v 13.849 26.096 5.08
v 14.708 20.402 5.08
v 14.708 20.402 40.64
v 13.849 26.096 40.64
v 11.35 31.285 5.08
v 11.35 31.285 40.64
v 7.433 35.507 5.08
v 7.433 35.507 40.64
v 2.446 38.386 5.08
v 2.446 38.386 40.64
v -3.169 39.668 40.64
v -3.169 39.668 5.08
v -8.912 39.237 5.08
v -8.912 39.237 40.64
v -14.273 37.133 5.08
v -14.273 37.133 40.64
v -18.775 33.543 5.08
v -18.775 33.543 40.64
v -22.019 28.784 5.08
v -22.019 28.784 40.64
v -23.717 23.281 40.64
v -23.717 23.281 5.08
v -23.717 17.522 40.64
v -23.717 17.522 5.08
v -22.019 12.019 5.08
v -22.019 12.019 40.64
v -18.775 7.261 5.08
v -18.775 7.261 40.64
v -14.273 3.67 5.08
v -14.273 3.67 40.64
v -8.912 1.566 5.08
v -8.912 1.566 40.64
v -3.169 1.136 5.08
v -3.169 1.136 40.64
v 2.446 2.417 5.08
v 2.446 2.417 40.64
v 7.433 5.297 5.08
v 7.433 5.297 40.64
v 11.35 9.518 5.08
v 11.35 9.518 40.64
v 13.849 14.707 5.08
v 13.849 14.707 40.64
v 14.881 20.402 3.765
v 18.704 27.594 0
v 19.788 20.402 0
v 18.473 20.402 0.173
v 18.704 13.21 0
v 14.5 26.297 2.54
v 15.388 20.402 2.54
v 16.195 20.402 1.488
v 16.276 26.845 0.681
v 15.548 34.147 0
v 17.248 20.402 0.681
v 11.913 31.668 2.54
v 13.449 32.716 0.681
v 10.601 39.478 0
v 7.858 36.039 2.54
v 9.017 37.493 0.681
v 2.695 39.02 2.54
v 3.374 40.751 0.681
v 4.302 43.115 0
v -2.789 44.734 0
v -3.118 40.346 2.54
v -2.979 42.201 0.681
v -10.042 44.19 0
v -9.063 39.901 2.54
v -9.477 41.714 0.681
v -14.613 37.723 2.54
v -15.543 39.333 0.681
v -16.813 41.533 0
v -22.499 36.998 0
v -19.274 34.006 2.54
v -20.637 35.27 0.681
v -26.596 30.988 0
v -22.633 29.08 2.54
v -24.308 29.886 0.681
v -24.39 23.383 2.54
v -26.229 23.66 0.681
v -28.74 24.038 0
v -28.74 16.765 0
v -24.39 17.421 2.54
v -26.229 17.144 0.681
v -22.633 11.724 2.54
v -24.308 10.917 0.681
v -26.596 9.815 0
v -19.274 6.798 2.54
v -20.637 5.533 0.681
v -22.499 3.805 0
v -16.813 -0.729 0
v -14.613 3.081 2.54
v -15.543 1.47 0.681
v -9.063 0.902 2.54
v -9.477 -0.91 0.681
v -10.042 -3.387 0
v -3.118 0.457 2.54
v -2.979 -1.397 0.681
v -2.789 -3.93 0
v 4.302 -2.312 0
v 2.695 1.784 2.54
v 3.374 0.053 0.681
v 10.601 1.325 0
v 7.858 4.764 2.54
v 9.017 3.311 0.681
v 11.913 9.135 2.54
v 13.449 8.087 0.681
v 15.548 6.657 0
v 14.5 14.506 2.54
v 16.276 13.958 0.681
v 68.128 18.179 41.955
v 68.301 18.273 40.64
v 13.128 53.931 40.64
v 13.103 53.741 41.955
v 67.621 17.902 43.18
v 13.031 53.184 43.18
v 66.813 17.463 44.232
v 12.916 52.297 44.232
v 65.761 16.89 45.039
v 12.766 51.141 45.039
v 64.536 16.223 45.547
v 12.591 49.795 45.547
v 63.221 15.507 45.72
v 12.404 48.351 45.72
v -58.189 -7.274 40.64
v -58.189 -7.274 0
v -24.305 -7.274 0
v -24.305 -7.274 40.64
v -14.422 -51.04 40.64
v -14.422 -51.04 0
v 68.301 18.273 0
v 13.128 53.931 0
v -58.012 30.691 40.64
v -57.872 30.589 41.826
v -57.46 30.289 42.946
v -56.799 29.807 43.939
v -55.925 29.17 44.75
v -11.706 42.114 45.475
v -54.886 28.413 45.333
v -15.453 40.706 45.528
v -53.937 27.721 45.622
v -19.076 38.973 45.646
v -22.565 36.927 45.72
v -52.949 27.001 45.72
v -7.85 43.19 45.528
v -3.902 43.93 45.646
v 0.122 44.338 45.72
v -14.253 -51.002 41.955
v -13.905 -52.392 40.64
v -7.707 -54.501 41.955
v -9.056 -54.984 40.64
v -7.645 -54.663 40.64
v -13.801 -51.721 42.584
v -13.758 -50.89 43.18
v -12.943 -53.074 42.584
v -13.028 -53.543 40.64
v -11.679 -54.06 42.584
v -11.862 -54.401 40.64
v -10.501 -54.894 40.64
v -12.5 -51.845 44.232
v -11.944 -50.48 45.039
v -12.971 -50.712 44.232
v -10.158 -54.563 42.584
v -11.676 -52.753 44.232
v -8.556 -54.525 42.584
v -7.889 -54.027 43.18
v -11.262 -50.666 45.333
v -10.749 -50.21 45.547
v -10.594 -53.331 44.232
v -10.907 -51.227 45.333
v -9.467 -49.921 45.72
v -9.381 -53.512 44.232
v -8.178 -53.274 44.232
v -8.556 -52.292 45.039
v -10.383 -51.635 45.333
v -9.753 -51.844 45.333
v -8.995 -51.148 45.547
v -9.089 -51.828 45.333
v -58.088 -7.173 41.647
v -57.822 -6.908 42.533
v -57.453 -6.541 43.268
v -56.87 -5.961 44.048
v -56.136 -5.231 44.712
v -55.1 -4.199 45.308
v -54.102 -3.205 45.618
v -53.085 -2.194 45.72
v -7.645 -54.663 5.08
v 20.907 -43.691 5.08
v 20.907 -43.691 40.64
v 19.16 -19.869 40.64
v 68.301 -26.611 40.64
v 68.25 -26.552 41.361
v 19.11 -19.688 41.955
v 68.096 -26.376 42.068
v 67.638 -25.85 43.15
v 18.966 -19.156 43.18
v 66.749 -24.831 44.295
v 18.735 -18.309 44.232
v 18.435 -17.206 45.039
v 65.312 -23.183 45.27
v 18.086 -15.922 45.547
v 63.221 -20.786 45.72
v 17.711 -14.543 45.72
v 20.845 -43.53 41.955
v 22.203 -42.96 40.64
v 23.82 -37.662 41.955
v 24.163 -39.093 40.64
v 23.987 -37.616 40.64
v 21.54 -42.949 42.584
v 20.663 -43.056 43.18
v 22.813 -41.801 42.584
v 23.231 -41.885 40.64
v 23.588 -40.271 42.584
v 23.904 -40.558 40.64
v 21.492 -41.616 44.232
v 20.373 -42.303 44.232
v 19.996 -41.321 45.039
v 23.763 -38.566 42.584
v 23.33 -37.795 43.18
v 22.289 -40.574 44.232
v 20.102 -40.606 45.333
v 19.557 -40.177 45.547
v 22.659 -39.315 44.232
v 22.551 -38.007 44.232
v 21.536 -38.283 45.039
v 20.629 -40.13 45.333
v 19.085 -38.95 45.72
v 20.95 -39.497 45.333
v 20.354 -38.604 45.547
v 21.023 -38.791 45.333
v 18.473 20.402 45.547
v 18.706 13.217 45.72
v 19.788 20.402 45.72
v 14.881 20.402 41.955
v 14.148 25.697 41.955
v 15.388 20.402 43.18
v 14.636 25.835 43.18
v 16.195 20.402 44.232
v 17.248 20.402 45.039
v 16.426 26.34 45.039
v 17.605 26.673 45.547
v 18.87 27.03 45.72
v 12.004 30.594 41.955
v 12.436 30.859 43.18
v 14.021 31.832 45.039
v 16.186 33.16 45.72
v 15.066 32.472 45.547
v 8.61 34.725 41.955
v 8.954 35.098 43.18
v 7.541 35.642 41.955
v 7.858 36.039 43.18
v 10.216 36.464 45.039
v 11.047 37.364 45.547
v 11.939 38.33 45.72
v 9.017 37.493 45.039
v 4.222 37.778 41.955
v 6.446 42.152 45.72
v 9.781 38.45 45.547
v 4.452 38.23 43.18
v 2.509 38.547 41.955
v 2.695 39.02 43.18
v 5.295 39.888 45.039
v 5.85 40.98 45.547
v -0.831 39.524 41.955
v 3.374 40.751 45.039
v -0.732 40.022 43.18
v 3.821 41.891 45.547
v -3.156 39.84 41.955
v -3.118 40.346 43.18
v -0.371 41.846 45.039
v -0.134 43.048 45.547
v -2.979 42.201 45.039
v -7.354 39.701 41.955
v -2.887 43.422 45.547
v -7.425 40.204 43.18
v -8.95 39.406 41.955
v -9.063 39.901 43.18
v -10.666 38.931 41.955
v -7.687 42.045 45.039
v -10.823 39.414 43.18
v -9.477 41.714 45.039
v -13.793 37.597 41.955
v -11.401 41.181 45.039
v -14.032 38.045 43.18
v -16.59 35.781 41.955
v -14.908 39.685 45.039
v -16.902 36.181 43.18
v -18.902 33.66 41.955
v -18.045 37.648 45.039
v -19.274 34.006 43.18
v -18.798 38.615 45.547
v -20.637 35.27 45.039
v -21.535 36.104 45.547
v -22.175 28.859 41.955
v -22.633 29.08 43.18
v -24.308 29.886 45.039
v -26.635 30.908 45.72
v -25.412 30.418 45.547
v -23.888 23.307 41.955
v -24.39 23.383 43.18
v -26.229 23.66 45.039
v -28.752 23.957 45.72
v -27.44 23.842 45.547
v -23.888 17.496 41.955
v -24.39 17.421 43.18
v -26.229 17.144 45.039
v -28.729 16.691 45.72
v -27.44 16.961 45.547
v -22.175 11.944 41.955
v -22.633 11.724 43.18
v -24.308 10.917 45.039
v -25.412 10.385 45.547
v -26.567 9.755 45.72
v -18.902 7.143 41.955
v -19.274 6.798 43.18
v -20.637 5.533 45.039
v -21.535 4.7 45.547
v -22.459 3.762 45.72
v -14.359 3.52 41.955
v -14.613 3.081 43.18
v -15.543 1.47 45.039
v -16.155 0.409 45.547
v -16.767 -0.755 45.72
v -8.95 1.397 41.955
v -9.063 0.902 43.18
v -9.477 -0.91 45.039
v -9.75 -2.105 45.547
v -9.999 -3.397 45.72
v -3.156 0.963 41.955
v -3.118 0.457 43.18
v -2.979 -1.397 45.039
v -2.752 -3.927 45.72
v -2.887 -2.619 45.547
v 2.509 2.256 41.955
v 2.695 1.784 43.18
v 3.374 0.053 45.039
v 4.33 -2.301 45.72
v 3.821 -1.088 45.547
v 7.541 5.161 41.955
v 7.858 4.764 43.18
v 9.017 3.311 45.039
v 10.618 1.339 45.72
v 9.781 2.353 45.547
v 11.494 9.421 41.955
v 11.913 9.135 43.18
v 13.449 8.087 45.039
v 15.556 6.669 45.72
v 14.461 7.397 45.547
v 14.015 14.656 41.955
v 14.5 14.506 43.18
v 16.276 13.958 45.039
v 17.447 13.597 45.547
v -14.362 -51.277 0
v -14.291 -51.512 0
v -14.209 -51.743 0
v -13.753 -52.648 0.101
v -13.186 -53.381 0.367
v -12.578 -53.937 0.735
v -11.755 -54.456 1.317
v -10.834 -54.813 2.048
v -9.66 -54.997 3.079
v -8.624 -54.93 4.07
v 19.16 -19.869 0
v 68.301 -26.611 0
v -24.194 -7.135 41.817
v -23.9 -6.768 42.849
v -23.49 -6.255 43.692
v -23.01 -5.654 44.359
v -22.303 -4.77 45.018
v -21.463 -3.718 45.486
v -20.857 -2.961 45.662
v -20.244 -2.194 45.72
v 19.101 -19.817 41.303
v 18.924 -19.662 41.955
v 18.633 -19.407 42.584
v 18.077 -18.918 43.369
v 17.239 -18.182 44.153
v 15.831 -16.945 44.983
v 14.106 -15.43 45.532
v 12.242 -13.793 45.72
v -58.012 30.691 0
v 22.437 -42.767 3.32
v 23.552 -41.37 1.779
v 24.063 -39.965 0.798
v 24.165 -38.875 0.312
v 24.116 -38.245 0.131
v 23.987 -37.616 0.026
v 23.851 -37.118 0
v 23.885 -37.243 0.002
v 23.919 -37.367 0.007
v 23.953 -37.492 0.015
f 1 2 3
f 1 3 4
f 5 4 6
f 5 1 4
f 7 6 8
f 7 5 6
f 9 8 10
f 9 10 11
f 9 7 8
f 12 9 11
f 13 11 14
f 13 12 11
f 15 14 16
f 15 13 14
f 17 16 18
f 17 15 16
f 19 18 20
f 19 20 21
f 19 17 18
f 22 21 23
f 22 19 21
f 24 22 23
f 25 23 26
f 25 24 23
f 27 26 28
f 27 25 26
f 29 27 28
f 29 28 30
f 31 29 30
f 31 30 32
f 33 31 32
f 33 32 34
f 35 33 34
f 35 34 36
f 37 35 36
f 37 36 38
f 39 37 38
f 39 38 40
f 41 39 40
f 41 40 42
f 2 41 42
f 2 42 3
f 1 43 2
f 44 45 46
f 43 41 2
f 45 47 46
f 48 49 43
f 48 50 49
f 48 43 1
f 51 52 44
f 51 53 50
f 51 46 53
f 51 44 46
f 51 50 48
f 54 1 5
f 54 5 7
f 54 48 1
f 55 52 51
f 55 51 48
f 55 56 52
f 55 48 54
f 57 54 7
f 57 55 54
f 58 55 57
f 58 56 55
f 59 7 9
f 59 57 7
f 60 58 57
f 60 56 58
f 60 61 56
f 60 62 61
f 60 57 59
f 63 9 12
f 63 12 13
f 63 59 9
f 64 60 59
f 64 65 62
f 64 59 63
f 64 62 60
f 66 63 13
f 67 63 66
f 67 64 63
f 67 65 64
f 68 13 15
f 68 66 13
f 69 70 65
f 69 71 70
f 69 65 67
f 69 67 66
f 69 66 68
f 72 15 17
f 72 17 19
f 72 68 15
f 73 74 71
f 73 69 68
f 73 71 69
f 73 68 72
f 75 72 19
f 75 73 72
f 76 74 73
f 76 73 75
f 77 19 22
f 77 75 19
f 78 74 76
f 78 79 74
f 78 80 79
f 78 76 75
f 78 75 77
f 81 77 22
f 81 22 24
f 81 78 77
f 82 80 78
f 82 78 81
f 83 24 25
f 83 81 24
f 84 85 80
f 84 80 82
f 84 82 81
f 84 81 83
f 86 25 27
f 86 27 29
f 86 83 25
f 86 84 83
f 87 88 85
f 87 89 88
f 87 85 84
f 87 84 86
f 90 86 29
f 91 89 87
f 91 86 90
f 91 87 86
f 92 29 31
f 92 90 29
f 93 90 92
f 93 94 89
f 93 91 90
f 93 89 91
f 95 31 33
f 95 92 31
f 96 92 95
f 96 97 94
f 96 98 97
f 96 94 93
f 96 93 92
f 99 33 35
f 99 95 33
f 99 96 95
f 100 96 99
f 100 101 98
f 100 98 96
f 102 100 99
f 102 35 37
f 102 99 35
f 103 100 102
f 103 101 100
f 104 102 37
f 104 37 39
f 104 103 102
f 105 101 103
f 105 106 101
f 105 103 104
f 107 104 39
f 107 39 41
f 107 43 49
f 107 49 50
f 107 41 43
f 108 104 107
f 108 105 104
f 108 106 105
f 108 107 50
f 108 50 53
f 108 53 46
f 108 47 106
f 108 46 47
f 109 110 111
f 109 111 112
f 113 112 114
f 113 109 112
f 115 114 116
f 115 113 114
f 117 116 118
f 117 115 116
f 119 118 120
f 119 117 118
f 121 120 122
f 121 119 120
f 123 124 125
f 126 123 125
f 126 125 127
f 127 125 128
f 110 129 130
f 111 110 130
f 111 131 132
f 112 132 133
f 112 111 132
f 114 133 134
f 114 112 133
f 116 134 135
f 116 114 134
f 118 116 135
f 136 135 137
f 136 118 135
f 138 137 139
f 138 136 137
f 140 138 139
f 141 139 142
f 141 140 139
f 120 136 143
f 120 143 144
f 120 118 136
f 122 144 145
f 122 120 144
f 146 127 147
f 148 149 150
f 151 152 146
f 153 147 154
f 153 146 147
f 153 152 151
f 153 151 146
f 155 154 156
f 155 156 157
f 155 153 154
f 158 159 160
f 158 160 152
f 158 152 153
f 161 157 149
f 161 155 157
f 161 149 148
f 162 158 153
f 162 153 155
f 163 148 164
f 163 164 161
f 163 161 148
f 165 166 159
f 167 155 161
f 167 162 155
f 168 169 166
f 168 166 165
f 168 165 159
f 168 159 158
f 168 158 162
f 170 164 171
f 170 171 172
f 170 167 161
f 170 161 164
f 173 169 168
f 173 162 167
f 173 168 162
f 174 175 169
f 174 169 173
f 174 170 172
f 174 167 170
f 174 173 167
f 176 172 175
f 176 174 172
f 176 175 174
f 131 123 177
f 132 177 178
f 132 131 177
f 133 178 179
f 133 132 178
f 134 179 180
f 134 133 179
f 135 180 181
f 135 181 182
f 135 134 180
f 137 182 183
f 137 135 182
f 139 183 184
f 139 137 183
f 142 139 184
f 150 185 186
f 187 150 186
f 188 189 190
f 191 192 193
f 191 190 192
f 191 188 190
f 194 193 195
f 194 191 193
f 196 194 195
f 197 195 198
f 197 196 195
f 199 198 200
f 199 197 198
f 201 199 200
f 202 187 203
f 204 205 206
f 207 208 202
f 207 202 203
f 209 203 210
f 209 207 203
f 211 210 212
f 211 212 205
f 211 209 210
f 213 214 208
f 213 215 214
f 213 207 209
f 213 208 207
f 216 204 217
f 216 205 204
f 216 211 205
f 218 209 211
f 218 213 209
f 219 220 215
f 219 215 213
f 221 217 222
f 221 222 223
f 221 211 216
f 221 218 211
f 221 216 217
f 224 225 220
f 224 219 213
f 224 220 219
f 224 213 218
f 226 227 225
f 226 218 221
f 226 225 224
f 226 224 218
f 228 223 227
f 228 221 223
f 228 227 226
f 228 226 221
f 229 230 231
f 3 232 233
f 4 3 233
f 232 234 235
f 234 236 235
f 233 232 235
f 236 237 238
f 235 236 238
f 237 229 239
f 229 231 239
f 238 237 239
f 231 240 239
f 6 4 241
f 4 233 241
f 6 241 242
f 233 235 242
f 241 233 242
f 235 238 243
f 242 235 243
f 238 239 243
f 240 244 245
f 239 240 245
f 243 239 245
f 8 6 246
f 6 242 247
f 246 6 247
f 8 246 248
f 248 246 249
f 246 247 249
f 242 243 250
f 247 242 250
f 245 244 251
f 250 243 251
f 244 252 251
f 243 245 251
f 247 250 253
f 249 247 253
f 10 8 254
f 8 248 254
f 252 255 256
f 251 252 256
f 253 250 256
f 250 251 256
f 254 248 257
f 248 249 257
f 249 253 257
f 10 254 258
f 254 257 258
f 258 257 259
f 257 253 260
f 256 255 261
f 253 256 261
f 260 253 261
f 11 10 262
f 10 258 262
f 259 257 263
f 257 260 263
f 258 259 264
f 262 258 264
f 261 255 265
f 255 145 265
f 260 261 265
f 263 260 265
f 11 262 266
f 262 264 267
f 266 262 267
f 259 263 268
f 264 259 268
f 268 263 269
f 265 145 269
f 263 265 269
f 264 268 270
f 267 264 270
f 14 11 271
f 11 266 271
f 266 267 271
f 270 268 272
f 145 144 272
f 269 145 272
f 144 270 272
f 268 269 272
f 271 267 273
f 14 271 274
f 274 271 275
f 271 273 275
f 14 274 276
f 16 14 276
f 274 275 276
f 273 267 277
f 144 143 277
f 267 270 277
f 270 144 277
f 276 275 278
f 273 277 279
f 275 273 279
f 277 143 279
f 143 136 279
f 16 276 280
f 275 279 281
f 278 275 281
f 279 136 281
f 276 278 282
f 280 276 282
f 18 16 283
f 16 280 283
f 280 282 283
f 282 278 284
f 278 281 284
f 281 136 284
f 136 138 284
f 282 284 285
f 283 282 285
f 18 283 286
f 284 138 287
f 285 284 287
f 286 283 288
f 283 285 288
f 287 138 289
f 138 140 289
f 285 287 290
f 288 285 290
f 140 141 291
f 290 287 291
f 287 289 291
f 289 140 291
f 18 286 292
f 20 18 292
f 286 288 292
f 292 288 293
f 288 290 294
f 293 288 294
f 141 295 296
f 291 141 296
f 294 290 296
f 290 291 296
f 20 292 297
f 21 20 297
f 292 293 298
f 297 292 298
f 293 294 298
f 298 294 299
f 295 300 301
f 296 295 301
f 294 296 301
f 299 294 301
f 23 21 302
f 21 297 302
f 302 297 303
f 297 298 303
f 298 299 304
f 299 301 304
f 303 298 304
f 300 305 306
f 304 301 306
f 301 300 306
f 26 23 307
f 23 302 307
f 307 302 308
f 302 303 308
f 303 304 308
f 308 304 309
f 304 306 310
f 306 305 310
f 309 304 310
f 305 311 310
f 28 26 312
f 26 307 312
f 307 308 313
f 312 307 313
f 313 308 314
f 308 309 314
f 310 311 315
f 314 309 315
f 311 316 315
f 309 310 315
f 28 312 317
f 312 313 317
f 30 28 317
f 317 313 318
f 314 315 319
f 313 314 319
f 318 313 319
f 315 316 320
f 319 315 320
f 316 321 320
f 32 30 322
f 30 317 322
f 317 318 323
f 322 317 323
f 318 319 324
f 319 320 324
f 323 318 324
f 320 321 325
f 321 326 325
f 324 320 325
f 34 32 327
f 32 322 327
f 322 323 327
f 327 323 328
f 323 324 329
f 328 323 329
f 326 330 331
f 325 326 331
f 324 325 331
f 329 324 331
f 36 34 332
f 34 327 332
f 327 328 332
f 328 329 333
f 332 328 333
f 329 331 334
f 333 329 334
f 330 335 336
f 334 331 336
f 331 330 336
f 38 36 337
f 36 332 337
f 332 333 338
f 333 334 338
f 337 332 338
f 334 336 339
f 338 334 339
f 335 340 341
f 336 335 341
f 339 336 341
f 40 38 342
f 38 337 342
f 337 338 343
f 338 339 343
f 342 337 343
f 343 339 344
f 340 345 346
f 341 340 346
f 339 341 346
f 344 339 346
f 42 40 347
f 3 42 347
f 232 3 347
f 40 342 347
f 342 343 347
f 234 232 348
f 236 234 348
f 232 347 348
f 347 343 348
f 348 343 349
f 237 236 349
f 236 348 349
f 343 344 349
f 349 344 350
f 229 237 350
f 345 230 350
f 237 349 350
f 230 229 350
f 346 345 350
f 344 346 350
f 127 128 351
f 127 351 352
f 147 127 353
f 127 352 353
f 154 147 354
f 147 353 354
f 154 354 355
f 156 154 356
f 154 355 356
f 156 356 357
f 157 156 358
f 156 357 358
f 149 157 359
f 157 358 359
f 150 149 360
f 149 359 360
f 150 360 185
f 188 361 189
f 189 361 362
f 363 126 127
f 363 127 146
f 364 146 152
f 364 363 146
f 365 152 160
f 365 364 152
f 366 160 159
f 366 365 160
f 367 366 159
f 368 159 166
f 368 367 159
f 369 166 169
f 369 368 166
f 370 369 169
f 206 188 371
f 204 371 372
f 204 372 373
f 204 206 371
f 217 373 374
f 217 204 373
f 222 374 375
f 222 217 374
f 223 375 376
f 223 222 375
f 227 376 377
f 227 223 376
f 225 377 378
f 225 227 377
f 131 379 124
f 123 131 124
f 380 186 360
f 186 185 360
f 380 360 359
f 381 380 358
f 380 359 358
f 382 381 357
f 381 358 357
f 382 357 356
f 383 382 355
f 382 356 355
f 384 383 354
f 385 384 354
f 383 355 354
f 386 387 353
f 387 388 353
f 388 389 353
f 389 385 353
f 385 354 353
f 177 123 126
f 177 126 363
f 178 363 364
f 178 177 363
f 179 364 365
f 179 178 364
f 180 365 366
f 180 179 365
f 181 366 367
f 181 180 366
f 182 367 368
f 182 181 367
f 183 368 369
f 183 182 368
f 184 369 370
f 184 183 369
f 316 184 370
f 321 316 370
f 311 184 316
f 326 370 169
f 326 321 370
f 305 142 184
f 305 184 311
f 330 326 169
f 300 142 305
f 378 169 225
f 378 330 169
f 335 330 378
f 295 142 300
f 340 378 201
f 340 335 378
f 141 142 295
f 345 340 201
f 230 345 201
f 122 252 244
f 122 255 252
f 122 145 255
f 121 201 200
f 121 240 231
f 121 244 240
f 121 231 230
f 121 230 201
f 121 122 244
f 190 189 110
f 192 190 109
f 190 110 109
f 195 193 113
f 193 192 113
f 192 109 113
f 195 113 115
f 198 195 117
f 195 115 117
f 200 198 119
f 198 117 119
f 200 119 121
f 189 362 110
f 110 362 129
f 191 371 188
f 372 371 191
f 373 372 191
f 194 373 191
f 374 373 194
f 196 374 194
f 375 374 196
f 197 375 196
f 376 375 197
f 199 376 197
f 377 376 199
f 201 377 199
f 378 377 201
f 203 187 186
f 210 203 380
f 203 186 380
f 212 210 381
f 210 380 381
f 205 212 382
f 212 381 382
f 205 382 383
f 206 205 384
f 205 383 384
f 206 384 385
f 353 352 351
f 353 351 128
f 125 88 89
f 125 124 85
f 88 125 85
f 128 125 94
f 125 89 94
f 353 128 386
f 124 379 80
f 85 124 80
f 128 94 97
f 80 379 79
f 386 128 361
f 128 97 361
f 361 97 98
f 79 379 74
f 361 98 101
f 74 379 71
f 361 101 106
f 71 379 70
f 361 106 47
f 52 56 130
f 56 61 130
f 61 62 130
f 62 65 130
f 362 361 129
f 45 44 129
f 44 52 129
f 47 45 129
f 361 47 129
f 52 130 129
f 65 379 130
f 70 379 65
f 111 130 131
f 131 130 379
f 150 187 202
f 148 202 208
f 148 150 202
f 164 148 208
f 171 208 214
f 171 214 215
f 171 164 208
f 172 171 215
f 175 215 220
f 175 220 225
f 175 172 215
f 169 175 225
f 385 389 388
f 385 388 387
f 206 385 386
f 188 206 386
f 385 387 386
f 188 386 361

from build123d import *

# Parameters (mm, degrees)
F0_R         = 19.3201303499
F1_DEPTH     = 45.72
F2_T1_DEPTH  = 55.325963316
F2_T3_DEPTH  = 52.1146440054
F2_T5_DEPTH  = 66.4513256331
F2_T7_DEPTH  = 30.5870827045
F2_T9_DEPTH  = 100.2395855595
F2_T11_DEPTH = 63.3652483976
F2_T13_DEPTH = 70.2836609721
F2_T15_DEPTH = 91.0933305156
F2_T20_DEPTH = 5.08
F2_T26_DEPTH = 5.08
F2_T36_DEPTH = 59.2845010847
F2_T41_DEPTH = 57.568004282
F2_T46_DEPTH = 31.0915483116
F2_T51_DEPTH = 75.0016446771
F2_T57_DEPTH = 59.2845010847
F2_T61_DEPTH = 57.568004282
F2_T68_DEPTH = 31.0915483116
F2_T72_DEPTH = 75.0016446771


# Not quite as in the source:
# - a fillet or chamfer that OpenCascade refuses, or shapes differently, is made with other operations: its cross-section is extruded or revolved along the edge and cut away or added


with BuildPart() as f1:
    # F0 (on Top) → F1 (new body)
    with BuildSketch(Plane.XY):
        Polygon((13.1280273199, 53.9313554764), (-58.0116845667, 30.691197142), (-58.1890903413, -7.2736367583), (-24.3045892566, -7.2736367583), (-13.1280263886, -56.7698441446), (25.1916181296, -42.0451648533), (19.1598236561, -19.8694467545), (68.3012157679, -26.610866189), (68.3012157679, 18.2727947831), align=None)
        with Locations((-4.6125496738, 20.4016622156)):
            Circle(F0_R, mode=Mode.SUBTRACT)
    extrude(amount=F1_DEPTH)

    # F2: fillet of radius 5.08 on 15 edges, made by hand

    # F2_s2 → F2_t1 (cut)
    with BuildSketch(Plane.XY.offset(-14.685963316)):
        with BuildLine():
            ThreePointArc((-14.4219236098, -51.039727833), (-11.8616097658, -54.4008391443), (-7.6445406789, -54.662763834))
            Line((-7.6445406789, -54.662763834), (-13.1280263886, -56.7698441446))
            Line((-13.1280263886, -56.7698441446), (-14.4219236098, -51.039727833))
        make_face()
    extrude(amount=F2_T1_DEPTH, mode=Mode.SUBTRACT)

    # F2_s4 → F2_t3 (cut)
    with BuildSketch(Plane.XY.offset(-11.4746440054)):
        with BuildLine():
            ThreePointArc((20.9071837297, -43.6914985622), (23.6160955732, -41.2464799373), (23.9869451943, -37.6162196147))
            Line((23.9869451943, -37.6162196147), (25.1916181296, -42.0451648533))
            Line((25.1916181296, -42.0451648533), (20.9071837297, -43.6914985622))
        make_face()
    extrude(amount=F2_T3_DEPTH, mode=Mode.SUBTRACT)

    # F2_s6 → F2_t5 (cut)
    with BuildSketch(Plane(origin=(-42.3016489373, -16.2548014713, 0), x_dir=(0, 0, 1), z_dir=(0.9334569329, 0.3586894958, 0))):
        with BuildLine():
            ThreePointArc((5.08, 48.2833194327), (1.4878975516, 46.7954218811), (0, 43.2033194327))
            Line((0, 43.2033194327), (0, 48.2833194327))
            Line((0, 48.2833194327), (5.08, 48.2833194327))
        make_face()
    extrude(amount=F2_T5_DEPTH, mode=Mode.SUBTRACT)

    # F2_s8 → F2_t7 (cut)
    with BuildSketch(Plane(origin=(-24.9632601794, -9.5923645646, 0), x_dir=(0, 0, 1), z_dir=(0.9334569329, 0.3586894958, 0))):
        with BuildLine():
            ThreePointArc((40.64, 48.2833194327), (44.2321024484, 46.7954218811), (45.72, 43.2033194327))
            Line((45.72, 43.2033194327), (45.72, 48.2833194327))
            Line((45.72, 48.2833194327), (40.64, 48.2833194327))
        make_face()
    extrude(amount=F2_T7_DEPTH, mode=Mode.SUBTRACT)

    # F2_s10 → F2_t9 (cut)
    with BuildSketch(Plane(origin=(39.8537401384, 13.0195527431, 0), x_dir=(0, 0, 1), z_dir=(-0.9505626114, -0.3105329641, 0))):
        with BuildLine():
            ThreePointArc((40.64, 47.1884448626), (44.2321024484, 45.700547311), (45.72, 42.1084448626))
            Line((45.72, 42.1084448626), (45.72, 47.1884448626))
            Line((45.72, 47.1884448626), (40.64, 47.1884448626))
        make_face()
    extrude(amount=F2_T9_DEPTH, mode=Mode.SUBTRACT)

    # F2_s12 → F2_t11 (cut)
    with BuildSketch(Plane(origin=(0.2014921201, 43.1193115962, 0), x_dir=(0, 0, 1), z_dir=(-0.0046728464, -0.9999890822, 0))):
        with BuildLine():
            ThreePointArc((40.64, 58.1544664567), (44.2321024484, 56.6665689051), (45.72, 53.0744664567))
            Line((45.72, 53.0744664567), (45.72, 58.1544664567))
            Line((45.72, 58.1544664567), (40.64, 58.1544664567))
        make_face()
    extrude(amount=F2_T11_DEPTH, mode=Mode.SUBTRACT)

    # F2_s14 → F2_t13 (cut)
    with BuildSketch(Plane.XZ.offset(-30.9727947831)):
        with BuildLine():
            ThreePointArc((68.3012157679, 40.64), (66.8133182163, 44.2321024484), (63.2212157679, 45.72))
            Line((63.2212157679, 45.72), (68.3012157679, 45.72))
            Line((68.3012157679, 45.72), (68.3012157679, 40.64))
        make_face()
    extrude(amount=F2_T13_DEPTH, mode=Mode.SUBTRACT)

    # F2_s16 → F2_t15 (cut)
    with BuildSketch(Plane(origin=(50.5132947185, -32.6468604807, 0), x_dir=(0, 0, 1), z_dir=(-0.8398598155, 0.5428033624, 0))):
        with BuildLine():
            ThreePointArc((40.64, 52.4207156327), (44.2321024484, 50.9328180811), (45.72, 47.3407156327))
            Line((45.72, 47.3407156327), (45.72, 52.4207156327))
            Line((45.72, 52.4207156327), (40.64, 52.4207156327))
        make_face()
    extrude(amount=F2_T15_DEPTH, mode=Mode.SUBTRACT)


with BuildPart() as f2_tool18:
    # F2_s19 → F2_t20 (new body)
    with BuildSketch(Plane.XY.offset(40.64)):
        Polygon((-9.4666833174, -49.9208026147), (-14.4219236098, -51.039727833), (-13.1280263886, -56.7698441446), (-7.6445406789, -54.662763834), align=None)
    extrude(amount=F2_T20_DEPTH)

    # F2_s21 → F2_t22 (revolve, cut)
    with BuildSketch(Plane(origin=(-9.4666833174, -49.9208026147, 40.64), x_dir=(0.4714422143, 0.8818969546, 0), z_dir=(0.8818969546, -0.4714422143, 0))):
        with BuildLine():
            ThreePointArc((0, -5.08), (5.08, 0), (0, 5.08))
            Line((0, 5.08), (0, -5.08))
        make_face()
    revolve(axis=Axis((-9.4666833174, -49.9208026147, 40.64), (0, 0, 1)), mode=Mode.SUBTRACT)


with BuildPart() as f1_1:
    add(f1.part)

    # F2_t17: cut F2_tool18
    add(f2_tool18.part, mode=Mode.SUBTRACT)


with BuildPart() as f2_tool24:
    # F2_s25 → F2_t26 (new body)
    with BuildSketch(Plane.XY.offset(40.64)):
        Polygon((19.0850410913, -38.9495373429), (20.9071837297, -43.6914985622), (25.1916181296, -42.0451648533), (23.9869451943, -37.6162196147), align=None)
    extrude(amount=F2_T26_DEPTH)

    # F2_s27 → F2_t28 (revolve, cut)
    with BuildSketch(Plane(origin=(19.0850410913, -38.9495373429, 40.64), x_dir=(-0.8919398586, 0.452154054, 0), z_dir=(0.452154054, 0.8919398586, 0))):
        with BuildLine():
            ThreePointArc((0, -5.08), (5.08, 0), (0, 5.08))
            Line((0, 5.08), (0, -5.08))
        make_face()
    revolve(axis=Axis((19.0850410913, -38.9495373429, 40.64), (0, 0, 1)), mode=Mode.SUBTRACT)


with BuildPart() as f1_2:
    add(f1_1.part)

    # F2_t23: cut F2_tool24
    add(f2_tool24.part, mode=Mode.SUBTRACT)

    # F2_s29 → F2_t30 (revolve, cut)
    with BuildSketch(Plane.XZ.offset(-20.4016622156)):
        with BuildLine():
            ThreePointArc((14.7075806761, 5.08), (16.1954782277, 1.4878975516), (19.7875806761, 0))
            Line((19.7875806761, 0), (14.7075806761, 0))
            Line((14.7075806761, 0), (14.7075806761, 5.08))
        make_face()
    revolve(axis=Axis((-4.6125496738, 20.4016622156, 0), (0, 0, 1)), mode=Mode.SUBTRACT)

    # F2_s31 → F2_t32 (revolve, cut)
    with BuildSketch(Plane.XZ.offset(-20.4016622156)):
        with BuildLine():
            ThreePointArc((14.7075806761, 40.64), (16.1954782277, 44.2321024484), (19.7875806761, 45.72))
            Line((19.7875806761, 45.72), (14.7075806761, 45.72))
            Line((14.7075806761, 45.72), (14.7075806761, 40.64))
        make_face()
    revolve(axis=Axis((-4.6125496738, 20.4016622156, 45.72), (0, 0, 1)), mode=Mode.SUBTRACT)


with BuildPart() as f2_tool34:
    # F2_s35 → F2_t36 (new body)
    with BuildSketch(Plane.YZ.offset(-70.8890903413)):
        with BuildLine():
            ThreePointArc((-7.2736367583, 40.64), (-5.7857392068, 44.2321024484), (-2.1936367583, 45.72))
            Line((-2.1936367583, 45.72), (-7.2736367583, 45.72))
            Line((-7.2736367583, 45.72), (-7.2736367583, 40.64))
        make_face()
    extrude(amount=F2_T36_DEPTH)

    split(bisect_by=Plane(origin=(-24.6882073851, -5.5747564614, 0), x_dir=(0, 0, 1), z_dir=(-0.9754410024, -0.2202608697, 0)), keep=Keep.TOP)


with BuildPart() as f1_3:
    add(f1_2.part)

    # F2_t33: cut F2_tool34
    add(f2_tool34.part, mode=Mode.SUBTRACT)


with BuildPart() as f2_tool39:
    # F2_s40 → F2_t41 (new body)
    with BuildSketch(Plane(origin=(-2.4136949173, 10.6892204341, 0), x_dir=(0, 0, 1), z_dir=(0.2202608697, -0.9754410024, 0))):
        with BuildLine():
            ThreePointArc((40.64, 25.3097904672), (44.2321024484, 23.8218929156), (45.72, 20.2297904672))
            Line((45.72, 20.2297904672), (45.72, 25.3097904672))
            Line((45.72, 25.3097904672), (40.64, 25.3097904672))
        make_face()
    extrude(amount=F2_T41_DEPTH)

    split(bisect_by=Plane.XZ.offset(7.2736367583), keep=Keep.TOP)


with BuildPart() as f1_4:
    add(f1_3.part)

    # F2_t38: cut F2_tool39
    add(f2_tool39.part, mode=Mode.SUBTRACT)


with BuildPart() as f2_tool44:
    # F2_s45 → F2_t46 (new body)
    with BuildSketch(Plane(origin=(11.1791797465, -41.0999313259, 0), x_dir=(0, 0, 1), z_dir=(-0.2624641197, 0.9649417526, 0))):
        with BuildLine():
            ThreePointArc((40.64, 13.2730969655), (44.2321024484, 11.7851994139), (45.72, 8.1930969655))
            Line((45.72, 8.1930969655), (45.72, 13.2730969655))
            Line((45.72, 13.2730969655), (40.64, 13.2730969655))
        make_face()
    extrude(amount=F2_T46_DEPTH)

    split(bisect_by=Plane(origin=(-2.3215052957, -16.9225491951, 0), x_dir=(0, 0, 1), z_dir=(-0.1359112078, -0.9907210221, 0)), keep=Keep.TOP)


with BuildPart() as f1_5:
    add(f1_4.part)

    # F2_t43: cut F2_tool44
    add(f2_tool44.part, mode=Mode.SUBTRACT)


with BuildPart() as f2_tool49:
    # F2_s50 → F2_t51 (new body)
    with BuildSketch(Plane(origin=(8.8991719713, -1.2208252209, 0), x_dir=(0, 0, 1), z_dir=(0.9907210221, -0.1359112078, 0))):
        with BuildLine():
            ThreePointArc((40.64, 17.0810438235), (44.2321024484, 15.5931462719), (45.72, 12.0010438235))
            Line((45.72, 12.0010438235), (45.72, 17.0810438235))
            Line((45.72, 17.0810438235), (40.64, 17.0810438235))
        make_face()
    extrude(amount=F2_T51_DEPTH)

    split(bisect_by=Plane(origin=(12.8077654479, 3.4837117113, 0), x_dir=(0, 0, 1), z_dir=(0.9649417526, 0.2624641197, 0)), keep=Keep.TOP)


with BuildPart() as f1_6:
    add(f1_5.part)

    # F2_t48: cut F2_tool49
    add(f2_tool49.part, mode=Mode.SUBTRACT)


with BuildPart() as f2_tool55:
    # F2_s56 → F2_t57 (new body)
    with BuildSketch(Plane.YZ.offset(-70.8890903413)):
        with BuildLine():
            ThreePointArc((-7.2736367583, 40.64), (-5.7857392068, 44.2321024484), (-2.1936367583, 45.72))
            Line((-2.1936367583, 45.72), (-7.2736367583, 45.72))
            Line((-7.2736367583, 45.72), (-7.2736367583, 40.64))
        make_face()
    extrude(amount=F2_T57_DEPTH)

    split(bisect_by=Plane(origin=(-24.6882073851, -5.5747564614, 0), x_dir=(0, 0, 1), z_dir=(0.9754410024, 0.2202608697, 0)), keep=Keep.TOP)


with BuildPart() as f2_tool59:
    # F2_s60 → F2_t61 (new body)
    with BuildSketch(Plane(origin=(-2.4136949173, 10.6892204341, 0), x_dir=(0, 0, 1), z_dir=(0.2202608697, -0.9754410024, 0))):
        with BuildLine():
            ThreePointArc((40.64, 25.3097904672), (44.2321024484, 23.8218929156), (45.72, 20.2297904672))
            Line((45.72, 20.2297904672), (45.72, 25.3097904672))
            Line((45.72, 25.3097904672), (40.64, 25.3097904672))
        make_face()
    extrude(amount=F2_T61_DEPTH)

    split(bisect_by=Plane.XZ.offset(7.2736367583), keep=Keep.BOTTOM)


with BuildPart() as f2_tool55_1:
    add(f2_tool55.part)

    # F2_t63: intersect F2_tool59
    add(f2_tool59.part, mode=Mode.INTERSECT)


with BuildPart() as f1_7:
    add(f1_6.part)

    # F2_t53: cut F2_tool55
    add(f2_tool55_1.part, mode=Mode.SUBTRACT)


with BuildPart() as f2_tool66:
    # F2_s67 → F2_t68 (new body)
    with BuildSketch(Plane(origin=(11.1791797465, -41.0999313259, 0), x_dir=(0, 0, 1), z_dir=(-0.2624641197, 0.9649417526, 0))):
        with BuildLine():
            ThreePointArc((40.64, 13.2730969655), (44.2321024484, 11.7851994139), (45.72, 8.1930969655))
            Line((45.72, 8.1930969655), (45.72, 13.2730969655))
            Line((45.72, 13.2730969655), (40.64, 13.2730969655))
        make_face()
    extrude(amount=F2_T68_DEPTH)

    split(bisect_by=Plane(origin=(-2.3215052957, -16.9225491951, 0), x_dir=(0, 0, 1), z_dir=(0.1359112078, 0.9907210221, 0)), keep=Keep.TOP)


with BuildPart() as f2_tool70:
    # F2_s71 → F2_t72 (new body)
    with BuildSketch(Plane(origin=(8.8991719713, -1.2208252209, 0), x_dir=(0, 0, 1), z_dir=(0.9907210221, -0.1359112078, 0))):
        with BuildLine():
            ThreePointArc((40.64, 17.0810438235), (44.2321024484, 15.5931462719), (45.72, 12.0010438235))
            Line((45.72, 12.0010438235), (45.72, 17.0810438235))
            Line((45.72, 17.0810438235), (40.64, 17.0810438235))
        make_face()
    extrude(amount=F2_T72_DEPTH)

    split(bisect_by=Plane(origin=(12.8077654479, 3.4837117113, 0), x_dir=(0, 0, 1), z_dir=(-0.9649417526, -0.2624641197, 0)), keep=Keep.TOP)


with BuildPart() as f2_tool66_1:
    add(f2_tool66.part)

    # F2_t74: intersect F2_tool70
    add(f2_tool70.part, mode=Mode.INTERSECT)


with BuildPart() as f1_8:
    add(f1_7.part)

    # F2_t64: cut F2_tool66
    add(f2_tool66_1.part, mode=Mode.SUBTRACT)


solid = f1_8.part
